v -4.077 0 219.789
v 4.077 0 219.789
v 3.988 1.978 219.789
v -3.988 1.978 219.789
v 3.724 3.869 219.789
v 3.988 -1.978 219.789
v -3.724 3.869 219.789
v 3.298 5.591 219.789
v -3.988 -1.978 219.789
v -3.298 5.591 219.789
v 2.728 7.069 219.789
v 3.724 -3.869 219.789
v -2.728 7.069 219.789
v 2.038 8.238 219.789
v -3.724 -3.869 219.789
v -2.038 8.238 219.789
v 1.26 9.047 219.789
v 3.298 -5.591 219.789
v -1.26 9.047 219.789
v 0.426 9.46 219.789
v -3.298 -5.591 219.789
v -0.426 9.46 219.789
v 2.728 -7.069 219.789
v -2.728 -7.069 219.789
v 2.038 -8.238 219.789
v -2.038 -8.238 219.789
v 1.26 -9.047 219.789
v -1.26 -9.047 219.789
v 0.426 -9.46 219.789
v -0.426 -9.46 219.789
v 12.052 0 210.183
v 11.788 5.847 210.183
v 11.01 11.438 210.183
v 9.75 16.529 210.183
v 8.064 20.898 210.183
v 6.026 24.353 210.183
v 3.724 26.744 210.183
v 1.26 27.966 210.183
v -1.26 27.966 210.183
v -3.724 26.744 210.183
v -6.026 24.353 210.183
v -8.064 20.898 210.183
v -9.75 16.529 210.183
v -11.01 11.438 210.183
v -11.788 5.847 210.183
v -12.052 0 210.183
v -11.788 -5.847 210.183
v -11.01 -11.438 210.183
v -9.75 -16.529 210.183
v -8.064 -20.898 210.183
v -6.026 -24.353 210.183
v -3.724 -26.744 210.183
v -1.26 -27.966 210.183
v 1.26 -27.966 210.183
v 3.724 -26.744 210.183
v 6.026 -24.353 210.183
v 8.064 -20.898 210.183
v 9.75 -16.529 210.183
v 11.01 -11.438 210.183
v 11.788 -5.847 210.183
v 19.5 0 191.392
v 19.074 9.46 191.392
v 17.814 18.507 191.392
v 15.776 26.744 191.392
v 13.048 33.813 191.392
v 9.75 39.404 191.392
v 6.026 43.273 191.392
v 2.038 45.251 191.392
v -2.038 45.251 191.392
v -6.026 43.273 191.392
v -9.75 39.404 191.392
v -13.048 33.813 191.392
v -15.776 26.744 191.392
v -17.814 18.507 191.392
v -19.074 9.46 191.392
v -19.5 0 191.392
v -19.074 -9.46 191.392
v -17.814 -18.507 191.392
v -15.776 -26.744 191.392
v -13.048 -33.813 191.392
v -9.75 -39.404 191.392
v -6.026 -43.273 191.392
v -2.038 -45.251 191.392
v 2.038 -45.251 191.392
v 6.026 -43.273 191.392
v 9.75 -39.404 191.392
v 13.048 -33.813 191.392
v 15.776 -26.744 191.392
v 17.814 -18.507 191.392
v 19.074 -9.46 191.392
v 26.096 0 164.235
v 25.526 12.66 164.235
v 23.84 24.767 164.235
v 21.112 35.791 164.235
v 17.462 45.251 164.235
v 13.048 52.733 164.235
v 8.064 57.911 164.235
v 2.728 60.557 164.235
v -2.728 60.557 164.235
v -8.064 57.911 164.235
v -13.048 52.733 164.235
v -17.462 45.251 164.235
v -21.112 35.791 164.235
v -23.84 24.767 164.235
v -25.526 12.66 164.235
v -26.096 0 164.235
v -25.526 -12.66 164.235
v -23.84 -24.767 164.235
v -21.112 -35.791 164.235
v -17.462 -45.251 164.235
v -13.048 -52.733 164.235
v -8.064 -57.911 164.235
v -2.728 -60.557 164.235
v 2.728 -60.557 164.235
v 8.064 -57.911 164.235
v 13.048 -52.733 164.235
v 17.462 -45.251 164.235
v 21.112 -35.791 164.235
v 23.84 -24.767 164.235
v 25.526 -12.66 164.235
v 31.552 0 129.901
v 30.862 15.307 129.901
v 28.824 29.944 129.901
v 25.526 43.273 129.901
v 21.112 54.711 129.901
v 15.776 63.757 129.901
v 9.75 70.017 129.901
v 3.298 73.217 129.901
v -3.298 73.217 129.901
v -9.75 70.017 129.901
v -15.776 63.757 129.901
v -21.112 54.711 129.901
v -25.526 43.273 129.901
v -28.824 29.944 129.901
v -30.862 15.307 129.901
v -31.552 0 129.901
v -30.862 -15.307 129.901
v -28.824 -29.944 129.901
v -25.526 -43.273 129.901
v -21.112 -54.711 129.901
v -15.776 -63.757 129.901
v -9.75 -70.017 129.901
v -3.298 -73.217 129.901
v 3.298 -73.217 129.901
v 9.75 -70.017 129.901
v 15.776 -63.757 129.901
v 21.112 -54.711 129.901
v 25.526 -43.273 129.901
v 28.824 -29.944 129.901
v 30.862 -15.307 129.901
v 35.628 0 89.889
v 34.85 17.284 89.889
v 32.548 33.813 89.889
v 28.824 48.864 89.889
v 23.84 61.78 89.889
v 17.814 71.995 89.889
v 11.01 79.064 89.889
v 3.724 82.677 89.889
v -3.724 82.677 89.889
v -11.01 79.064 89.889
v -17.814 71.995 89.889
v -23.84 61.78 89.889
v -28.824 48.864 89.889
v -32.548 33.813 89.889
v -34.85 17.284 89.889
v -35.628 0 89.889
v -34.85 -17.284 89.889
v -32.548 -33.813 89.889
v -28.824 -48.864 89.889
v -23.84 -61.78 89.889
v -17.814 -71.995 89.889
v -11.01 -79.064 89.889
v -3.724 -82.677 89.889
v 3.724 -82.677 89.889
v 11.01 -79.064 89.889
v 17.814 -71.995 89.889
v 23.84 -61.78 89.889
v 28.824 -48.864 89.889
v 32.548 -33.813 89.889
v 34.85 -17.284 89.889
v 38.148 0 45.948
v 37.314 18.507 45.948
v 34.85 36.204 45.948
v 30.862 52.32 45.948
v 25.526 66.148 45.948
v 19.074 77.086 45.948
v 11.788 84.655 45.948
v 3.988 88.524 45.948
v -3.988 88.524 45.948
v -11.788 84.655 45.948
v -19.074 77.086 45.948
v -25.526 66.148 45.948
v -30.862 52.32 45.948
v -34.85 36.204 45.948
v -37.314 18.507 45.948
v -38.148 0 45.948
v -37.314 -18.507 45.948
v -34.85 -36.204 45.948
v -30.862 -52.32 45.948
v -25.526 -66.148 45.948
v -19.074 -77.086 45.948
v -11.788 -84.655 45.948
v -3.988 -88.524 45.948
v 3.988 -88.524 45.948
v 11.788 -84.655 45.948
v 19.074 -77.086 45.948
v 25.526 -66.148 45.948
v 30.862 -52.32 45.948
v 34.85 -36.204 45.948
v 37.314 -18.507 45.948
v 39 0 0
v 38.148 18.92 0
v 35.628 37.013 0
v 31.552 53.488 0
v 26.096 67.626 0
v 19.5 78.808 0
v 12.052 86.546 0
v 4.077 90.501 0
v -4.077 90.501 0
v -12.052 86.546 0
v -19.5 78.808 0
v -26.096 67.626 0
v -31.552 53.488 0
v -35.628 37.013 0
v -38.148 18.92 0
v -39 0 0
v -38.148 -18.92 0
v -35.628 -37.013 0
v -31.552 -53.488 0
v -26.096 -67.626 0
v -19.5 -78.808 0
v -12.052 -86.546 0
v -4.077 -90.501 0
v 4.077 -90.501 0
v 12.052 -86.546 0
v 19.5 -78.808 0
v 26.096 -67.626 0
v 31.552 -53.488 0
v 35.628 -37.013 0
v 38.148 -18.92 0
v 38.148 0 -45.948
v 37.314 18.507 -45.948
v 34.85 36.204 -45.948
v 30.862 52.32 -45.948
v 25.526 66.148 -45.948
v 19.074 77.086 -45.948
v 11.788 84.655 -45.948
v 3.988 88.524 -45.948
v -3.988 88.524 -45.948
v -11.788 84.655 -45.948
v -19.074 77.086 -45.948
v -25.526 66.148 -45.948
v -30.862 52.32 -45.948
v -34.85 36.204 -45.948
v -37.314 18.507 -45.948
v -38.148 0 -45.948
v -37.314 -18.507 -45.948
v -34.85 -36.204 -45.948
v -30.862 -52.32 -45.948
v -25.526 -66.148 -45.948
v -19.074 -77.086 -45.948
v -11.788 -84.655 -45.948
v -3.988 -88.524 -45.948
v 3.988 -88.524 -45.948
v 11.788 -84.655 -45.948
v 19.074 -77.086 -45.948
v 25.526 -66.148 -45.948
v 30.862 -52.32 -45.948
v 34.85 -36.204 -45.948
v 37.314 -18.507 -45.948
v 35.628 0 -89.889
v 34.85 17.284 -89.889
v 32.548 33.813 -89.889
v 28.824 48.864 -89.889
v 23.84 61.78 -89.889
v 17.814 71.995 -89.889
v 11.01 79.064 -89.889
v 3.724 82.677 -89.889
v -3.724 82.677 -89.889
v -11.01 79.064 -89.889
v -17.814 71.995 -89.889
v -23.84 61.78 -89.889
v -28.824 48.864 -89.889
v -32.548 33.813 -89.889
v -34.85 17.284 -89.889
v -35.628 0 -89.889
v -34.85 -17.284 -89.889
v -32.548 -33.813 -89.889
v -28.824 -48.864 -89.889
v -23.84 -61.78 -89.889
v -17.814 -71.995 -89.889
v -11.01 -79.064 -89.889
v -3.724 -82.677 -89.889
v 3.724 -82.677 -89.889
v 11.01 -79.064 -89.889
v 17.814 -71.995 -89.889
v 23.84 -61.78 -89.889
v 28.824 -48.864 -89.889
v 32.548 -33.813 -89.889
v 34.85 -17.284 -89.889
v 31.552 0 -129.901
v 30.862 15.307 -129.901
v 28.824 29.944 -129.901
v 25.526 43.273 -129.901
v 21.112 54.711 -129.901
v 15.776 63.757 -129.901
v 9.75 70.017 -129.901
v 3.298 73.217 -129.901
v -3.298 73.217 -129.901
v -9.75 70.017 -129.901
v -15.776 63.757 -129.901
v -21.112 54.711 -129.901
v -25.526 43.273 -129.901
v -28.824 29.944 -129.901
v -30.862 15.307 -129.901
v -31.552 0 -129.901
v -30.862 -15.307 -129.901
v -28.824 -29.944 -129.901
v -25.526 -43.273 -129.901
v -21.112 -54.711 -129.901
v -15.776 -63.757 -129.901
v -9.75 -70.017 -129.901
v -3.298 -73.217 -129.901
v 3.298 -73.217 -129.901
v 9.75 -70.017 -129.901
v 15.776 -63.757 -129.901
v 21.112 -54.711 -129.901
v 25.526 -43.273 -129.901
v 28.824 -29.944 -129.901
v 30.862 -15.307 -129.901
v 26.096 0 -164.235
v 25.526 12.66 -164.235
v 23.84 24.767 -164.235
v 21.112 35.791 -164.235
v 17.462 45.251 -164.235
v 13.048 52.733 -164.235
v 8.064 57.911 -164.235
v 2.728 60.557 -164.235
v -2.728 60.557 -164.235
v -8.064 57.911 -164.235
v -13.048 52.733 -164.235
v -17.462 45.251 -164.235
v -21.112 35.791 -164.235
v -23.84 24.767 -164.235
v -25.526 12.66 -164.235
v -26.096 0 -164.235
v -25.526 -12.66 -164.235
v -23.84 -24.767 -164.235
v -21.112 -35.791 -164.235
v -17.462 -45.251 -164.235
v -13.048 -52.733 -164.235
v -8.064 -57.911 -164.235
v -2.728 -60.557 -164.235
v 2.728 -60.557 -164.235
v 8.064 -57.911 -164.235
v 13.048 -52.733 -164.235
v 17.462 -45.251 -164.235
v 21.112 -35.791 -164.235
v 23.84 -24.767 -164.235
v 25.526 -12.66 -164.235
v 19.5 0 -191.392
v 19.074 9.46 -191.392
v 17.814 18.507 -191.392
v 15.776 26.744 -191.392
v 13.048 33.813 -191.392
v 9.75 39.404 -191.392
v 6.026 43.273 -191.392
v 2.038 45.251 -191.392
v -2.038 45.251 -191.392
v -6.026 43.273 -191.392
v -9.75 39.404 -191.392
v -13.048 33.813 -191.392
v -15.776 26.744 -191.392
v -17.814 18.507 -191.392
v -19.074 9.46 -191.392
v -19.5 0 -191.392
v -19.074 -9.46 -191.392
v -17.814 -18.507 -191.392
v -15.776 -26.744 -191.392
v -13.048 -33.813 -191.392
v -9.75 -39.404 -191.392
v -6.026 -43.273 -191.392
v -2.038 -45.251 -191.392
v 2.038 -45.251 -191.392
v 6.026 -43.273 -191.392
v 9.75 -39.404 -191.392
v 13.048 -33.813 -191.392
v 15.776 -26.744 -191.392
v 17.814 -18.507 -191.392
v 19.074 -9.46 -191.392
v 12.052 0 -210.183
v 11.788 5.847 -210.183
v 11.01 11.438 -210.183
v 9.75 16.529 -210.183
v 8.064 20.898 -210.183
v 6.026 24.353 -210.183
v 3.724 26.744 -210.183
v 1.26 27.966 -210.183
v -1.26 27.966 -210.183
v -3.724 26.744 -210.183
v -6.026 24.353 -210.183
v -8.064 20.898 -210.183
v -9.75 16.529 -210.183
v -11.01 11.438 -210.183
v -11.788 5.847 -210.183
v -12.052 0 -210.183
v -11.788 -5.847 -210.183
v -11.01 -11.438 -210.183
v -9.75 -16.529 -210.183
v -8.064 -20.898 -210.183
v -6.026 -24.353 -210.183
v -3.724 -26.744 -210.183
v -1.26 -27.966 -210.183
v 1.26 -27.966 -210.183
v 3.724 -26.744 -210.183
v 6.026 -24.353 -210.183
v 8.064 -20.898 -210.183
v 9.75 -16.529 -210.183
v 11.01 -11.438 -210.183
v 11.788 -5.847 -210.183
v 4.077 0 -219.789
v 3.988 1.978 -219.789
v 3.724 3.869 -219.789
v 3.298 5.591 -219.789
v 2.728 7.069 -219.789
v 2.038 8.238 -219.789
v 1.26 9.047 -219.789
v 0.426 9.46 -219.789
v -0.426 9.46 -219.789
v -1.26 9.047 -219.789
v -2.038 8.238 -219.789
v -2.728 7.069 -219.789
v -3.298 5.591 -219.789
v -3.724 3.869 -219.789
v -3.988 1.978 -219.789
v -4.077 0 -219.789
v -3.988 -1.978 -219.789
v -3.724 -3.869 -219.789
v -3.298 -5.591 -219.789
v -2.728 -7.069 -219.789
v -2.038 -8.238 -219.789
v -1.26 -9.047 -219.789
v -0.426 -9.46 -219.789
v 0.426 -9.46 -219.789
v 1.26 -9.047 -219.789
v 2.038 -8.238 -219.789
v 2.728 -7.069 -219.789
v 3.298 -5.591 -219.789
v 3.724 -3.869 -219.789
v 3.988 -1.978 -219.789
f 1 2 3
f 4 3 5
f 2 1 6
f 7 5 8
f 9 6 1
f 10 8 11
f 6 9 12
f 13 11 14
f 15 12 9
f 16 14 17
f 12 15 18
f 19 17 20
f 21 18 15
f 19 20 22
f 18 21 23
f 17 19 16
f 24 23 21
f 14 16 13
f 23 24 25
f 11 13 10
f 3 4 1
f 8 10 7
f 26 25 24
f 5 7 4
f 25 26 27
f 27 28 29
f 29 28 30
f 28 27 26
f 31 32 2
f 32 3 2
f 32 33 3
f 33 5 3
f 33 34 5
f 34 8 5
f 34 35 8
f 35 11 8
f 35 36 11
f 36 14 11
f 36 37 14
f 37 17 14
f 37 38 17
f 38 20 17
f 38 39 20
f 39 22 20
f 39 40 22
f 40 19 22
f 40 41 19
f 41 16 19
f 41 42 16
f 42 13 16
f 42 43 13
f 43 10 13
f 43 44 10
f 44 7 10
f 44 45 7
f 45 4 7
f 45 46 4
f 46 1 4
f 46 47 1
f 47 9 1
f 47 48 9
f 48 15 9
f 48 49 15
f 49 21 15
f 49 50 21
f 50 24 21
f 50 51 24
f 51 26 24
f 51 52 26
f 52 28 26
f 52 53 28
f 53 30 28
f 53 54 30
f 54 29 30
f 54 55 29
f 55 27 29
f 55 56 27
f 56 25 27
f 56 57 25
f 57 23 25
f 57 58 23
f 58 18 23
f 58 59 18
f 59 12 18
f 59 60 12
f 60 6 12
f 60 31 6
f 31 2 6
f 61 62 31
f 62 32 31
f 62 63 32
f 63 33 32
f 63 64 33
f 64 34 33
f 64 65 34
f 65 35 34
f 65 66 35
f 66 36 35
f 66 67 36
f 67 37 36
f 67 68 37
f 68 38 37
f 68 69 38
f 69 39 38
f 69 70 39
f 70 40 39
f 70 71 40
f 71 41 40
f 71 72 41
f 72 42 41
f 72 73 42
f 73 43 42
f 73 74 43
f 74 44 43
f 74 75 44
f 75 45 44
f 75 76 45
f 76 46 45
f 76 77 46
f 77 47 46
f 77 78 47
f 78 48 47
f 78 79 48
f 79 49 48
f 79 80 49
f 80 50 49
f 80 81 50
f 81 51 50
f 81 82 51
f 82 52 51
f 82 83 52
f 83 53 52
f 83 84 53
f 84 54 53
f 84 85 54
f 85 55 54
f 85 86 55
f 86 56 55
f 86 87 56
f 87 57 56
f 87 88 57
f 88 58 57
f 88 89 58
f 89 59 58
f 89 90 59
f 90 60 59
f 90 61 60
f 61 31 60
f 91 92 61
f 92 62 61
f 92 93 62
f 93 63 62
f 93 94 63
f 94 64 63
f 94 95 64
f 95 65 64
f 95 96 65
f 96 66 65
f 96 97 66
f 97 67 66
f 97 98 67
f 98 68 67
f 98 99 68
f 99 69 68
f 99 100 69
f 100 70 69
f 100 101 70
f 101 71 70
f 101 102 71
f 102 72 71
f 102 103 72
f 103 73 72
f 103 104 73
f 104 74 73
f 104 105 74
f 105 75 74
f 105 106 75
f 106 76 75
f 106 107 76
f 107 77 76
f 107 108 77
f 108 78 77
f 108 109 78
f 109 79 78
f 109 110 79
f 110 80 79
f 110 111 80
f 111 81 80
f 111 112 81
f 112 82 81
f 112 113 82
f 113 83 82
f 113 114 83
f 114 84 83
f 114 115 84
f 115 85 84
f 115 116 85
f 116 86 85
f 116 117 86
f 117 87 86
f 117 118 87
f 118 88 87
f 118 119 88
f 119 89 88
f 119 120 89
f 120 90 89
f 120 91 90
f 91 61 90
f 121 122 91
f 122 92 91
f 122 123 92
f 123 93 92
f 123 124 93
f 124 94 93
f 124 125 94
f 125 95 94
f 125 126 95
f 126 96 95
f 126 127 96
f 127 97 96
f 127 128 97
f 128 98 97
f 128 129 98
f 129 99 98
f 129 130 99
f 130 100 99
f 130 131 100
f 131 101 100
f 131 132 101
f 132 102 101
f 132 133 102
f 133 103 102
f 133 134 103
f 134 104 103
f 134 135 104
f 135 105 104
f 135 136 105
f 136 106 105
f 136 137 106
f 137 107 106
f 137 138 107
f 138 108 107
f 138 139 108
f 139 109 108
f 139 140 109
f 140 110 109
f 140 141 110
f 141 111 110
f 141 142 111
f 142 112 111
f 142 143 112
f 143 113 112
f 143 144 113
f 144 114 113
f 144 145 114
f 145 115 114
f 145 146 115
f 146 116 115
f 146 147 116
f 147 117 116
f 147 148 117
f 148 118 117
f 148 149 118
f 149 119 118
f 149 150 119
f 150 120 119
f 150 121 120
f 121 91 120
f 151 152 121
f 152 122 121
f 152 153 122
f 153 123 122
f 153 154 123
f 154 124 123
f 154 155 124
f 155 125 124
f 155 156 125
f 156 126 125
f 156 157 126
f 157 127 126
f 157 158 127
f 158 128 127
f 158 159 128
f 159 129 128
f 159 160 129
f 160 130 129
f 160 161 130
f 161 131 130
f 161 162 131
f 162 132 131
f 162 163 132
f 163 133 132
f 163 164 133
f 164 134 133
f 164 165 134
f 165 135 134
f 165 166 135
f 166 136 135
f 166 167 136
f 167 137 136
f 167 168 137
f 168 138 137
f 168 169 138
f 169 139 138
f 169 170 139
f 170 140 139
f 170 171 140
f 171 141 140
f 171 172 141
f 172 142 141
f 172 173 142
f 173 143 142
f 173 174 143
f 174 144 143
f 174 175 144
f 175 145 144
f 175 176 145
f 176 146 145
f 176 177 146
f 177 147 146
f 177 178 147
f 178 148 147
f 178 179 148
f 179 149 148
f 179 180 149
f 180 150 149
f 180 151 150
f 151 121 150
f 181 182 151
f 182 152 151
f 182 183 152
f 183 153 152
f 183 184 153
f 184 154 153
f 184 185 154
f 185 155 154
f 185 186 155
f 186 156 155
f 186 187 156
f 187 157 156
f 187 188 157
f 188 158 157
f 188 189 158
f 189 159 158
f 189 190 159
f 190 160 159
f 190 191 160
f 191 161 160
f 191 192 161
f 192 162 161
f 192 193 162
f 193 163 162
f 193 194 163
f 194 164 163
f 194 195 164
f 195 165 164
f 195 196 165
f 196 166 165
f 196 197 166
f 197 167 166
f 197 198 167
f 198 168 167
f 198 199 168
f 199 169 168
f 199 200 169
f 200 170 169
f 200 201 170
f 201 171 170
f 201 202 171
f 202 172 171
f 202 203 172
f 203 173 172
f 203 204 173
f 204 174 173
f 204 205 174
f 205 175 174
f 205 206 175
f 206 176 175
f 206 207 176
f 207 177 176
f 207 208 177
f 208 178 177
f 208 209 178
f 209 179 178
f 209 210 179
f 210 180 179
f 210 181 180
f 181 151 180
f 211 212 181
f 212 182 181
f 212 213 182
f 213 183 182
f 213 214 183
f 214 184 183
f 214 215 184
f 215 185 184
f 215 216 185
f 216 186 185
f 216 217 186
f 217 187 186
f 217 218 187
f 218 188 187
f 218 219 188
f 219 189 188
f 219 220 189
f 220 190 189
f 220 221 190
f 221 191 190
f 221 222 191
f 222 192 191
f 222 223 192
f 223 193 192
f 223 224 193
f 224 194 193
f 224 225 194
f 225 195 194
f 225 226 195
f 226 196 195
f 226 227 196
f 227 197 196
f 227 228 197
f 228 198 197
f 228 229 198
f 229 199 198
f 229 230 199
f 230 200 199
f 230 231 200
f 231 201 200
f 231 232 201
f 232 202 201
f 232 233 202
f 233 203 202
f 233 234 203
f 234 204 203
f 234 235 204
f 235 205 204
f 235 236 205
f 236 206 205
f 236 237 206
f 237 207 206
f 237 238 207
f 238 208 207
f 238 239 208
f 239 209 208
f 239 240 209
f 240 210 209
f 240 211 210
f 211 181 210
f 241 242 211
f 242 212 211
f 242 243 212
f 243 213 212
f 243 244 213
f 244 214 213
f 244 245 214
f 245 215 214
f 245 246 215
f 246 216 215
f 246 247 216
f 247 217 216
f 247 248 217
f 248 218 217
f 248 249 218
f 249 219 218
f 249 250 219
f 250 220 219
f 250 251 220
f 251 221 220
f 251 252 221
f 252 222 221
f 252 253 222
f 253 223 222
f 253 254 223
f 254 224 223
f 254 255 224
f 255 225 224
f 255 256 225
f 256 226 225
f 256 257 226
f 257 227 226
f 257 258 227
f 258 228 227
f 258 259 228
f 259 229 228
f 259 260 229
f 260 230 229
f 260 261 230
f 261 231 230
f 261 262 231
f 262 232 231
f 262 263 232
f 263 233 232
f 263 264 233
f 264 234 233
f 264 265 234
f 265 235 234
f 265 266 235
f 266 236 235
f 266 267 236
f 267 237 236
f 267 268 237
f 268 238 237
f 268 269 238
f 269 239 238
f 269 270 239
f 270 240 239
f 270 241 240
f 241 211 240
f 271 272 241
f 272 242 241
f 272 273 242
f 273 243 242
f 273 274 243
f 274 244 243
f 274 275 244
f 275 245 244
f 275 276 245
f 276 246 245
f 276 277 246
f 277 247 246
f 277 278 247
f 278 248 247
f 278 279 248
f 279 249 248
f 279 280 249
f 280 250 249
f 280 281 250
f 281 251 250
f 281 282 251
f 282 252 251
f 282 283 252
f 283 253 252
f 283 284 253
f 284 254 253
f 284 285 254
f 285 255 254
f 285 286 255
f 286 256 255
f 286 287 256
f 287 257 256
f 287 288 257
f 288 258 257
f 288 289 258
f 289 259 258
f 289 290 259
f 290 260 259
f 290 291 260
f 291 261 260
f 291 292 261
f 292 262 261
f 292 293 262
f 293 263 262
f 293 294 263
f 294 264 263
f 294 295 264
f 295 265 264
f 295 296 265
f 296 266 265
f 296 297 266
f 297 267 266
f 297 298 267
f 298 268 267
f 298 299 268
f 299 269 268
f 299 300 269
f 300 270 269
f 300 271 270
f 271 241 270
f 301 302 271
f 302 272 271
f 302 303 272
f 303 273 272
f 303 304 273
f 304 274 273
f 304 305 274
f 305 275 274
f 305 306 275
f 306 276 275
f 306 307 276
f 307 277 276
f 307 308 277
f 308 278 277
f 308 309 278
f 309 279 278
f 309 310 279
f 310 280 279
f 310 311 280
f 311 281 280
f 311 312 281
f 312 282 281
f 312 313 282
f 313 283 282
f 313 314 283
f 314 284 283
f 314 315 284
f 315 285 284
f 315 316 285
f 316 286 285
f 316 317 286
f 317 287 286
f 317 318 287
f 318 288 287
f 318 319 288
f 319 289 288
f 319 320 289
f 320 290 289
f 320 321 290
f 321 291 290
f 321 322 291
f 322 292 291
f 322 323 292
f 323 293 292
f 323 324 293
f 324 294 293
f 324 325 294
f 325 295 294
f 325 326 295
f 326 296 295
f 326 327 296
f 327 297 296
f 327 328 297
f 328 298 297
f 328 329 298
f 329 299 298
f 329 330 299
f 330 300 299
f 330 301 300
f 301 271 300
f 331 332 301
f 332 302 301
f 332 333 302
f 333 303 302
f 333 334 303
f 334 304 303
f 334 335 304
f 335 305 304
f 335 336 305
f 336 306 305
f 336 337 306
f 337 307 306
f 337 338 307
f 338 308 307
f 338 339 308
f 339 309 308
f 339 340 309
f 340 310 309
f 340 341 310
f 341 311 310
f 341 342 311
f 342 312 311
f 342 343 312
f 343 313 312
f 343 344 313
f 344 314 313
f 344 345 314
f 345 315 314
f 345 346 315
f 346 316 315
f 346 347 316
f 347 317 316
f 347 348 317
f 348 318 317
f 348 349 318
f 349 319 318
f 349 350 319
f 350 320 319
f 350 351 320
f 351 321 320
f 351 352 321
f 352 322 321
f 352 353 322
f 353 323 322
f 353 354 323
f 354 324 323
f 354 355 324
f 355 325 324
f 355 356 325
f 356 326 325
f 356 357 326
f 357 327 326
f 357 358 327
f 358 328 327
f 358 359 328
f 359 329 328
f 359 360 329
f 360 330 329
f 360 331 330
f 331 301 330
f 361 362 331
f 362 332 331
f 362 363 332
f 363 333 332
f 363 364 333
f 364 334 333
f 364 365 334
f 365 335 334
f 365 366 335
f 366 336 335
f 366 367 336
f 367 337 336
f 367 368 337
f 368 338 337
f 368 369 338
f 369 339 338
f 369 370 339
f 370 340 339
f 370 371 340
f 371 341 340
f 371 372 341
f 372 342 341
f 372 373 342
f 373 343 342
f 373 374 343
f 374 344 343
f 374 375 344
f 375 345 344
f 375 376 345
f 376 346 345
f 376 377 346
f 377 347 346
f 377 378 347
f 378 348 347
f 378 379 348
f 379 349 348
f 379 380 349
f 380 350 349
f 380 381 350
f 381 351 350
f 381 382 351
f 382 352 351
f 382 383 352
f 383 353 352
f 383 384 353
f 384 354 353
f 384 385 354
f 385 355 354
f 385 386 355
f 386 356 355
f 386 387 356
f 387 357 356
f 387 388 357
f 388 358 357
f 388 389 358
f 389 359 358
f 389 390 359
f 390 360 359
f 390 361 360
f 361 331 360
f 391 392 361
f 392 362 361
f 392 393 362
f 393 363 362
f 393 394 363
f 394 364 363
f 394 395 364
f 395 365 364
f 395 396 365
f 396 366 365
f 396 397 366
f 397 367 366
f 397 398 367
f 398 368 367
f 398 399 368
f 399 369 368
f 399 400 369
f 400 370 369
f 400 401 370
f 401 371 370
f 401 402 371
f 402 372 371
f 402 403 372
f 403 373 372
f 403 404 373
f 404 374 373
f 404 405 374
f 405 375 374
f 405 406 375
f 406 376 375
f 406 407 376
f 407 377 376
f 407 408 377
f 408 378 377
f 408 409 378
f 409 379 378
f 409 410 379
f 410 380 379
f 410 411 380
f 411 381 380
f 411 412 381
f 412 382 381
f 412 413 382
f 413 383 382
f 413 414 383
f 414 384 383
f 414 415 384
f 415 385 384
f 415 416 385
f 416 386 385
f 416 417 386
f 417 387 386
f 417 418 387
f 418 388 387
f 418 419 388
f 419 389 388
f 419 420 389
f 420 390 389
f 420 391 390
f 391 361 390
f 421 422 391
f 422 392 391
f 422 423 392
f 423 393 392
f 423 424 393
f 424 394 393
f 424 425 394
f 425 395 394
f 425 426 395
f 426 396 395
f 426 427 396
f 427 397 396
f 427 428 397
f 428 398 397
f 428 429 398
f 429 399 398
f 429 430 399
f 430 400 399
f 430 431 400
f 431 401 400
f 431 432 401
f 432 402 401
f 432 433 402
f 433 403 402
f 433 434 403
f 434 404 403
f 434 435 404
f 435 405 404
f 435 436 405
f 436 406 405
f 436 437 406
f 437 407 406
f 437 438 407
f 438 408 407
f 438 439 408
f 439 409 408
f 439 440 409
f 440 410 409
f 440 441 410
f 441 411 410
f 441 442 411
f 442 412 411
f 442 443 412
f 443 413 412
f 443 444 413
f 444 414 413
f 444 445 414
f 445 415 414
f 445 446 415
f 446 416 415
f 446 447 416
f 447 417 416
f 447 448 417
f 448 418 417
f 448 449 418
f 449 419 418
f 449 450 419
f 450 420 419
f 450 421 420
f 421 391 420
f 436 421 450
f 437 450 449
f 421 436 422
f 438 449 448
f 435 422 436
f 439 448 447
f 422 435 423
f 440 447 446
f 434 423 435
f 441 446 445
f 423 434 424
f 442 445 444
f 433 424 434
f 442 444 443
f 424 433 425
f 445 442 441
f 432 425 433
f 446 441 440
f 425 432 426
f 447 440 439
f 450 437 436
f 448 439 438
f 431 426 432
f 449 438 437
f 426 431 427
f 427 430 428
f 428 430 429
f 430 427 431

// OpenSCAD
// Generated by SolidPython 1.0.1 on 2020-07-29 00:46:45


scale(v = [3, 7, 17]) {
	sphere(r = 13);
}
/***********************************************
*********      SolidPython code:      **********
************************************************
 
# import packages: SolidPython
from solid import *
from solid.utils import *
from itertools import chain, combinations, permutations


class Resize:

    def __init__(self, scad_file):
        self.scad_file = scad_file
        #self.scad_file = import_scad(scad_file)
        # cone/cylinder param:
        self.r1 = 0
        self.r2 = 0
        self.h = 0
        # rectangular prism param:
        self.w = 0
        self.l = 0
        # ellipse param:
        self.r = 0

    # import OpenScad code (file name corresponds to shape)


    # classify shape + parameters
    def assign(self, param1, param2, param3):
        if self.scad_file == 'cone.scad':
            self.r1 = param1
            self.r2 = param2
            self.h = param3
        elif self.scad_file == 'cylinder.scad':
            self.r1 = param1
            self.r2 = param2
            self.h = param3
        elif self.scad_file == 'rectangularPrism.scad':
            self.h = param1
            self.l = param2
            self.w = param3
        else:
            self.r = param1
            self.h = param2

    # resize parameters
    def iterate(self):
        x = range(3, 20, 2)
        i = 1
        if self.scad_file == 'cone.scad':
            tempList = list(permutations(x, 2))
            for temp in tempList:
                param1 = temp[0]
                param2 = temp[1]
                filepath = 'produced_scad_files/' + 'cone' + str(param1) + '_' + str(param2) + '_' + '.scad'
                scad_render_to_file(cylinder(h=param1, r1=param2, r2=0), filepath)

        elif self.scad_file == 'cylinder.scad':
            tempList = list(permutations(x, 3))
            for temp in tempList:
                param1 = temp[0]
                param2 = temp[1]
                filepath = 'produced_scad_files/' + 'cylinder' + str(param1) + '_' + str(param2) + '_' + '.scad'
                scad_render_to_file(cylinder(h=param1, r1=param2, r2=param2), filepath)

        elif self.scad_file == 'rectangularPrism.scad':
            tempList = list(permutations(x, 3))
            for temp in tempList:
                param1 = temp[0]
                param2 = temp[1]
                param3 = temp[2]
                filepath = 'produced_scad_files/' + 'rectangularPrism' + str(param1) + '_' + str(param2) + '_' + str(
                    param3) + '.scad'
                scad_render_to_file(cube(size=(param1, param2, param3)), filepath)

        elif self.scad_file == 'ellipse.scad':
            tempList = list(permutations(x, 4))
            for temp in tempList:
                param1 = temp[0]
                param2 = temp[1]
                param3 = temp[2]
                param4 = temp[3]
                filepath = 'produced_scad_files/' + 'ellipse' + str(param1) + '_' + str(param2) + '_' + str(param3) + '_' + str(param4) + '.scad'
                scad_render_to_file(scale([param1, param2, param3])(sphere(r=param4)), filepath)

    def render_to_scadfile(self):
        scad_render_to_file(scad, 'example.scad') 
 
************************************************/
